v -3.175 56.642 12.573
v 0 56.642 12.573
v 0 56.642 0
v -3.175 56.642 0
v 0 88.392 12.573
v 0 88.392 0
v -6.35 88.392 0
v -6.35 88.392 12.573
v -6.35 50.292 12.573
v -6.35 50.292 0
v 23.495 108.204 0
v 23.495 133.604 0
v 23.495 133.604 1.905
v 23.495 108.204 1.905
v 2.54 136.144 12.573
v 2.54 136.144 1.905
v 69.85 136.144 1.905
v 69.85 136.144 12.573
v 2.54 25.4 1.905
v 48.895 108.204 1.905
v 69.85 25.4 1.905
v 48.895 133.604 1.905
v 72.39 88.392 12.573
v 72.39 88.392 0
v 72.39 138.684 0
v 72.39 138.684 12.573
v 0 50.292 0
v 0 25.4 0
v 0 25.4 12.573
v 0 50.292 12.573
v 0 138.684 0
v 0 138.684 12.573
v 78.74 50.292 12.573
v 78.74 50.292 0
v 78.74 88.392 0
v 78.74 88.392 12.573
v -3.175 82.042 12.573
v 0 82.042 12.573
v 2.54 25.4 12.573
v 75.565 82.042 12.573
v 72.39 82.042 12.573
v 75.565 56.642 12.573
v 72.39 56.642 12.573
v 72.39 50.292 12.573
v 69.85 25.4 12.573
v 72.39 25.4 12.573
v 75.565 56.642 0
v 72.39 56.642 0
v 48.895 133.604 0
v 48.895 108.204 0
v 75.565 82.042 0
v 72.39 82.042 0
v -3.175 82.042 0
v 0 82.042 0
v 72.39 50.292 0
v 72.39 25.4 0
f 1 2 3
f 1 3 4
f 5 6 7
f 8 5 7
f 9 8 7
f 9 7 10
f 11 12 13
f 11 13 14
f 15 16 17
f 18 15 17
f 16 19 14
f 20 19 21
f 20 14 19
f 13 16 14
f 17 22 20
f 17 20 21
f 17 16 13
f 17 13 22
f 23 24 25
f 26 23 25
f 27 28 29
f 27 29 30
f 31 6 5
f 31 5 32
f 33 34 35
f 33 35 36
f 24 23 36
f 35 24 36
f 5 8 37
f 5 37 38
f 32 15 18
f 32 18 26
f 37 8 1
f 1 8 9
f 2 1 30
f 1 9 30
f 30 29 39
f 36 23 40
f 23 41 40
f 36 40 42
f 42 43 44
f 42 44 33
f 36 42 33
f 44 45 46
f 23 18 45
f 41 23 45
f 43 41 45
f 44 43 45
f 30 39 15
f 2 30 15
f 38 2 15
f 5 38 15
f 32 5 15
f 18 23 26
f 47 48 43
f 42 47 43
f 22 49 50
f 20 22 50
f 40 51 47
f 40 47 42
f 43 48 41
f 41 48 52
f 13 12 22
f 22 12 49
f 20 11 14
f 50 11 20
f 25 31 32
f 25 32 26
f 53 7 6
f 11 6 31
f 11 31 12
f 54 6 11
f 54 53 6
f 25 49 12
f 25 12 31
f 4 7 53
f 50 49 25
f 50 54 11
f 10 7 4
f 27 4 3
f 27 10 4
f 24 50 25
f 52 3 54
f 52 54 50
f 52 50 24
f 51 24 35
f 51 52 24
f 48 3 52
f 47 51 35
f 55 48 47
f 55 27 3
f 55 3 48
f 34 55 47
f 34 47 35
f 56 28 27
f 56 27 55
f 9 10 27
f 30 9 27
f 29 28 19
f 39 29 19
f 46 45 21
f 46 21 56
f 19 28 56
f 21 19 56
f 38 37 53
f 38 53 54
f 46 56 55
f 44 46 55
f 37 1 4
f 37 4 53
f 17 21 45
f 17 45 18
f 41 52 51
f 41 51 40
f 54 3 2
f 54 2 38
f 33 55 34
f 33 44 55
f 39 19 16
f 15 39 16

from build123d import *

# Parameters (mm, degrees)
F0_W      = 72.39
F0_H      = 138.684
F1_DEPTH  = 1.905
F2_W      = 72.39
F2_H      = 138.684
F2_W_2    = 67.31
F2_H_2    = 133.604
F3_DEPTH  = 10.668
F4_W      = 25.4
F4_H      = 25.4
F5_DEPTH  = 1.905
F6_W      = 6.35
F6_H      = 12.573
F7_DEPTH  = 3.175
F8_W      = 3.175
F8_H      = 12.573
F9_DEPTH  = 38.1
F10_W     = 3.175
F10_H     = 25.4
F11_DEPTH = 12.573
F12_W     = 72.39
F12_H     = 25.4
F13_DEPTH = 12.574


with BuildPart() as f1:
    # F0 (on Top) → F1 (new body)
    with BuildSketch(Plane.XY):
        with Locations((36.195, 69.342)):
            Rectangle(F0_W, F0_H)
    extrude(amount=F1_DEPTH)

    # F2 (on face) → F3 (join)
    with BuildSketch(Plane.XY.offset(1.905)):
        with Locations((36.195, 69.342)):
            Rectangle(F2_W, F2_H)
        with Locations((36.195, 69.342)):
            Rectangle(F2_W_2, F2_H_2, mode=Mode.SUBTRACT)
    extrude(amount=F3_DEPTH)

    # F4 (on face) → F5 (cut, through all)
    with BuildSketch(Plane(origin=(0, 0, 0), x_dir=(1, 0, 0), z_dir=(0, 0, -1))):
        with Locations((36.195, -120.904)):
            Rectangle(F4_W, F4_H)
    extrude(amount=-F5_DEPTH, mode=Mode.SUBTRACT)

    # F6 (on face) → F7 (join)
    with BuildSketch(Plane.YZ.offset(72.39)):
        with Locations((53.467, 6.2865)):
            Rectangle(F6_W, F6_H)
        with Locations((85.217, 6.2865)):
            Rectangle(F6_W, F6_H)
    extrude(amount=F7_DEPTH)

    # F8 (on face) → F9 (join, through all)
    with BuildSketch(Plane.XZ.offset(-50.292)):
        with Locations((77.1525, 6.2865)):
            Rectangle(F8_W, F8_H)
    extrude(amount=-F9_DEPTH)

    # F10 (on face) → F11 (join, through all)
    with BuildSketch(Plane.XY.offset(12.573)):
        Polygon((0, 82.042), (0, 88.392), (-6.35, 88.392), (-6.35, 82.042), (-3.175, 82.042), align=None)
        with Locations((-4.7625, 69.342)):
            Rectangle(F10_W, F10_H)
        Polygon((-3.175, 56.642), (-6.35, 56.642), (-6.35, 50.292), (0, 50.292), (0, 56.642), align=None)
    extrude(amount=-F11_DEPTH)

    # F12 (on face) → F13 (cut, through all)
    with BuildSketch(Plane(origin=(0, 0, 0), x_dir=(1, 0, 0), z_dir=(0, 0, -1))):
        with Locations((36.195, -12.7)):
            Rectangle(F12_W, F12_H)
    extrude(amount=-F13_DEPTH, mode=Mode.SUBTRACT)


solid = f1.part
